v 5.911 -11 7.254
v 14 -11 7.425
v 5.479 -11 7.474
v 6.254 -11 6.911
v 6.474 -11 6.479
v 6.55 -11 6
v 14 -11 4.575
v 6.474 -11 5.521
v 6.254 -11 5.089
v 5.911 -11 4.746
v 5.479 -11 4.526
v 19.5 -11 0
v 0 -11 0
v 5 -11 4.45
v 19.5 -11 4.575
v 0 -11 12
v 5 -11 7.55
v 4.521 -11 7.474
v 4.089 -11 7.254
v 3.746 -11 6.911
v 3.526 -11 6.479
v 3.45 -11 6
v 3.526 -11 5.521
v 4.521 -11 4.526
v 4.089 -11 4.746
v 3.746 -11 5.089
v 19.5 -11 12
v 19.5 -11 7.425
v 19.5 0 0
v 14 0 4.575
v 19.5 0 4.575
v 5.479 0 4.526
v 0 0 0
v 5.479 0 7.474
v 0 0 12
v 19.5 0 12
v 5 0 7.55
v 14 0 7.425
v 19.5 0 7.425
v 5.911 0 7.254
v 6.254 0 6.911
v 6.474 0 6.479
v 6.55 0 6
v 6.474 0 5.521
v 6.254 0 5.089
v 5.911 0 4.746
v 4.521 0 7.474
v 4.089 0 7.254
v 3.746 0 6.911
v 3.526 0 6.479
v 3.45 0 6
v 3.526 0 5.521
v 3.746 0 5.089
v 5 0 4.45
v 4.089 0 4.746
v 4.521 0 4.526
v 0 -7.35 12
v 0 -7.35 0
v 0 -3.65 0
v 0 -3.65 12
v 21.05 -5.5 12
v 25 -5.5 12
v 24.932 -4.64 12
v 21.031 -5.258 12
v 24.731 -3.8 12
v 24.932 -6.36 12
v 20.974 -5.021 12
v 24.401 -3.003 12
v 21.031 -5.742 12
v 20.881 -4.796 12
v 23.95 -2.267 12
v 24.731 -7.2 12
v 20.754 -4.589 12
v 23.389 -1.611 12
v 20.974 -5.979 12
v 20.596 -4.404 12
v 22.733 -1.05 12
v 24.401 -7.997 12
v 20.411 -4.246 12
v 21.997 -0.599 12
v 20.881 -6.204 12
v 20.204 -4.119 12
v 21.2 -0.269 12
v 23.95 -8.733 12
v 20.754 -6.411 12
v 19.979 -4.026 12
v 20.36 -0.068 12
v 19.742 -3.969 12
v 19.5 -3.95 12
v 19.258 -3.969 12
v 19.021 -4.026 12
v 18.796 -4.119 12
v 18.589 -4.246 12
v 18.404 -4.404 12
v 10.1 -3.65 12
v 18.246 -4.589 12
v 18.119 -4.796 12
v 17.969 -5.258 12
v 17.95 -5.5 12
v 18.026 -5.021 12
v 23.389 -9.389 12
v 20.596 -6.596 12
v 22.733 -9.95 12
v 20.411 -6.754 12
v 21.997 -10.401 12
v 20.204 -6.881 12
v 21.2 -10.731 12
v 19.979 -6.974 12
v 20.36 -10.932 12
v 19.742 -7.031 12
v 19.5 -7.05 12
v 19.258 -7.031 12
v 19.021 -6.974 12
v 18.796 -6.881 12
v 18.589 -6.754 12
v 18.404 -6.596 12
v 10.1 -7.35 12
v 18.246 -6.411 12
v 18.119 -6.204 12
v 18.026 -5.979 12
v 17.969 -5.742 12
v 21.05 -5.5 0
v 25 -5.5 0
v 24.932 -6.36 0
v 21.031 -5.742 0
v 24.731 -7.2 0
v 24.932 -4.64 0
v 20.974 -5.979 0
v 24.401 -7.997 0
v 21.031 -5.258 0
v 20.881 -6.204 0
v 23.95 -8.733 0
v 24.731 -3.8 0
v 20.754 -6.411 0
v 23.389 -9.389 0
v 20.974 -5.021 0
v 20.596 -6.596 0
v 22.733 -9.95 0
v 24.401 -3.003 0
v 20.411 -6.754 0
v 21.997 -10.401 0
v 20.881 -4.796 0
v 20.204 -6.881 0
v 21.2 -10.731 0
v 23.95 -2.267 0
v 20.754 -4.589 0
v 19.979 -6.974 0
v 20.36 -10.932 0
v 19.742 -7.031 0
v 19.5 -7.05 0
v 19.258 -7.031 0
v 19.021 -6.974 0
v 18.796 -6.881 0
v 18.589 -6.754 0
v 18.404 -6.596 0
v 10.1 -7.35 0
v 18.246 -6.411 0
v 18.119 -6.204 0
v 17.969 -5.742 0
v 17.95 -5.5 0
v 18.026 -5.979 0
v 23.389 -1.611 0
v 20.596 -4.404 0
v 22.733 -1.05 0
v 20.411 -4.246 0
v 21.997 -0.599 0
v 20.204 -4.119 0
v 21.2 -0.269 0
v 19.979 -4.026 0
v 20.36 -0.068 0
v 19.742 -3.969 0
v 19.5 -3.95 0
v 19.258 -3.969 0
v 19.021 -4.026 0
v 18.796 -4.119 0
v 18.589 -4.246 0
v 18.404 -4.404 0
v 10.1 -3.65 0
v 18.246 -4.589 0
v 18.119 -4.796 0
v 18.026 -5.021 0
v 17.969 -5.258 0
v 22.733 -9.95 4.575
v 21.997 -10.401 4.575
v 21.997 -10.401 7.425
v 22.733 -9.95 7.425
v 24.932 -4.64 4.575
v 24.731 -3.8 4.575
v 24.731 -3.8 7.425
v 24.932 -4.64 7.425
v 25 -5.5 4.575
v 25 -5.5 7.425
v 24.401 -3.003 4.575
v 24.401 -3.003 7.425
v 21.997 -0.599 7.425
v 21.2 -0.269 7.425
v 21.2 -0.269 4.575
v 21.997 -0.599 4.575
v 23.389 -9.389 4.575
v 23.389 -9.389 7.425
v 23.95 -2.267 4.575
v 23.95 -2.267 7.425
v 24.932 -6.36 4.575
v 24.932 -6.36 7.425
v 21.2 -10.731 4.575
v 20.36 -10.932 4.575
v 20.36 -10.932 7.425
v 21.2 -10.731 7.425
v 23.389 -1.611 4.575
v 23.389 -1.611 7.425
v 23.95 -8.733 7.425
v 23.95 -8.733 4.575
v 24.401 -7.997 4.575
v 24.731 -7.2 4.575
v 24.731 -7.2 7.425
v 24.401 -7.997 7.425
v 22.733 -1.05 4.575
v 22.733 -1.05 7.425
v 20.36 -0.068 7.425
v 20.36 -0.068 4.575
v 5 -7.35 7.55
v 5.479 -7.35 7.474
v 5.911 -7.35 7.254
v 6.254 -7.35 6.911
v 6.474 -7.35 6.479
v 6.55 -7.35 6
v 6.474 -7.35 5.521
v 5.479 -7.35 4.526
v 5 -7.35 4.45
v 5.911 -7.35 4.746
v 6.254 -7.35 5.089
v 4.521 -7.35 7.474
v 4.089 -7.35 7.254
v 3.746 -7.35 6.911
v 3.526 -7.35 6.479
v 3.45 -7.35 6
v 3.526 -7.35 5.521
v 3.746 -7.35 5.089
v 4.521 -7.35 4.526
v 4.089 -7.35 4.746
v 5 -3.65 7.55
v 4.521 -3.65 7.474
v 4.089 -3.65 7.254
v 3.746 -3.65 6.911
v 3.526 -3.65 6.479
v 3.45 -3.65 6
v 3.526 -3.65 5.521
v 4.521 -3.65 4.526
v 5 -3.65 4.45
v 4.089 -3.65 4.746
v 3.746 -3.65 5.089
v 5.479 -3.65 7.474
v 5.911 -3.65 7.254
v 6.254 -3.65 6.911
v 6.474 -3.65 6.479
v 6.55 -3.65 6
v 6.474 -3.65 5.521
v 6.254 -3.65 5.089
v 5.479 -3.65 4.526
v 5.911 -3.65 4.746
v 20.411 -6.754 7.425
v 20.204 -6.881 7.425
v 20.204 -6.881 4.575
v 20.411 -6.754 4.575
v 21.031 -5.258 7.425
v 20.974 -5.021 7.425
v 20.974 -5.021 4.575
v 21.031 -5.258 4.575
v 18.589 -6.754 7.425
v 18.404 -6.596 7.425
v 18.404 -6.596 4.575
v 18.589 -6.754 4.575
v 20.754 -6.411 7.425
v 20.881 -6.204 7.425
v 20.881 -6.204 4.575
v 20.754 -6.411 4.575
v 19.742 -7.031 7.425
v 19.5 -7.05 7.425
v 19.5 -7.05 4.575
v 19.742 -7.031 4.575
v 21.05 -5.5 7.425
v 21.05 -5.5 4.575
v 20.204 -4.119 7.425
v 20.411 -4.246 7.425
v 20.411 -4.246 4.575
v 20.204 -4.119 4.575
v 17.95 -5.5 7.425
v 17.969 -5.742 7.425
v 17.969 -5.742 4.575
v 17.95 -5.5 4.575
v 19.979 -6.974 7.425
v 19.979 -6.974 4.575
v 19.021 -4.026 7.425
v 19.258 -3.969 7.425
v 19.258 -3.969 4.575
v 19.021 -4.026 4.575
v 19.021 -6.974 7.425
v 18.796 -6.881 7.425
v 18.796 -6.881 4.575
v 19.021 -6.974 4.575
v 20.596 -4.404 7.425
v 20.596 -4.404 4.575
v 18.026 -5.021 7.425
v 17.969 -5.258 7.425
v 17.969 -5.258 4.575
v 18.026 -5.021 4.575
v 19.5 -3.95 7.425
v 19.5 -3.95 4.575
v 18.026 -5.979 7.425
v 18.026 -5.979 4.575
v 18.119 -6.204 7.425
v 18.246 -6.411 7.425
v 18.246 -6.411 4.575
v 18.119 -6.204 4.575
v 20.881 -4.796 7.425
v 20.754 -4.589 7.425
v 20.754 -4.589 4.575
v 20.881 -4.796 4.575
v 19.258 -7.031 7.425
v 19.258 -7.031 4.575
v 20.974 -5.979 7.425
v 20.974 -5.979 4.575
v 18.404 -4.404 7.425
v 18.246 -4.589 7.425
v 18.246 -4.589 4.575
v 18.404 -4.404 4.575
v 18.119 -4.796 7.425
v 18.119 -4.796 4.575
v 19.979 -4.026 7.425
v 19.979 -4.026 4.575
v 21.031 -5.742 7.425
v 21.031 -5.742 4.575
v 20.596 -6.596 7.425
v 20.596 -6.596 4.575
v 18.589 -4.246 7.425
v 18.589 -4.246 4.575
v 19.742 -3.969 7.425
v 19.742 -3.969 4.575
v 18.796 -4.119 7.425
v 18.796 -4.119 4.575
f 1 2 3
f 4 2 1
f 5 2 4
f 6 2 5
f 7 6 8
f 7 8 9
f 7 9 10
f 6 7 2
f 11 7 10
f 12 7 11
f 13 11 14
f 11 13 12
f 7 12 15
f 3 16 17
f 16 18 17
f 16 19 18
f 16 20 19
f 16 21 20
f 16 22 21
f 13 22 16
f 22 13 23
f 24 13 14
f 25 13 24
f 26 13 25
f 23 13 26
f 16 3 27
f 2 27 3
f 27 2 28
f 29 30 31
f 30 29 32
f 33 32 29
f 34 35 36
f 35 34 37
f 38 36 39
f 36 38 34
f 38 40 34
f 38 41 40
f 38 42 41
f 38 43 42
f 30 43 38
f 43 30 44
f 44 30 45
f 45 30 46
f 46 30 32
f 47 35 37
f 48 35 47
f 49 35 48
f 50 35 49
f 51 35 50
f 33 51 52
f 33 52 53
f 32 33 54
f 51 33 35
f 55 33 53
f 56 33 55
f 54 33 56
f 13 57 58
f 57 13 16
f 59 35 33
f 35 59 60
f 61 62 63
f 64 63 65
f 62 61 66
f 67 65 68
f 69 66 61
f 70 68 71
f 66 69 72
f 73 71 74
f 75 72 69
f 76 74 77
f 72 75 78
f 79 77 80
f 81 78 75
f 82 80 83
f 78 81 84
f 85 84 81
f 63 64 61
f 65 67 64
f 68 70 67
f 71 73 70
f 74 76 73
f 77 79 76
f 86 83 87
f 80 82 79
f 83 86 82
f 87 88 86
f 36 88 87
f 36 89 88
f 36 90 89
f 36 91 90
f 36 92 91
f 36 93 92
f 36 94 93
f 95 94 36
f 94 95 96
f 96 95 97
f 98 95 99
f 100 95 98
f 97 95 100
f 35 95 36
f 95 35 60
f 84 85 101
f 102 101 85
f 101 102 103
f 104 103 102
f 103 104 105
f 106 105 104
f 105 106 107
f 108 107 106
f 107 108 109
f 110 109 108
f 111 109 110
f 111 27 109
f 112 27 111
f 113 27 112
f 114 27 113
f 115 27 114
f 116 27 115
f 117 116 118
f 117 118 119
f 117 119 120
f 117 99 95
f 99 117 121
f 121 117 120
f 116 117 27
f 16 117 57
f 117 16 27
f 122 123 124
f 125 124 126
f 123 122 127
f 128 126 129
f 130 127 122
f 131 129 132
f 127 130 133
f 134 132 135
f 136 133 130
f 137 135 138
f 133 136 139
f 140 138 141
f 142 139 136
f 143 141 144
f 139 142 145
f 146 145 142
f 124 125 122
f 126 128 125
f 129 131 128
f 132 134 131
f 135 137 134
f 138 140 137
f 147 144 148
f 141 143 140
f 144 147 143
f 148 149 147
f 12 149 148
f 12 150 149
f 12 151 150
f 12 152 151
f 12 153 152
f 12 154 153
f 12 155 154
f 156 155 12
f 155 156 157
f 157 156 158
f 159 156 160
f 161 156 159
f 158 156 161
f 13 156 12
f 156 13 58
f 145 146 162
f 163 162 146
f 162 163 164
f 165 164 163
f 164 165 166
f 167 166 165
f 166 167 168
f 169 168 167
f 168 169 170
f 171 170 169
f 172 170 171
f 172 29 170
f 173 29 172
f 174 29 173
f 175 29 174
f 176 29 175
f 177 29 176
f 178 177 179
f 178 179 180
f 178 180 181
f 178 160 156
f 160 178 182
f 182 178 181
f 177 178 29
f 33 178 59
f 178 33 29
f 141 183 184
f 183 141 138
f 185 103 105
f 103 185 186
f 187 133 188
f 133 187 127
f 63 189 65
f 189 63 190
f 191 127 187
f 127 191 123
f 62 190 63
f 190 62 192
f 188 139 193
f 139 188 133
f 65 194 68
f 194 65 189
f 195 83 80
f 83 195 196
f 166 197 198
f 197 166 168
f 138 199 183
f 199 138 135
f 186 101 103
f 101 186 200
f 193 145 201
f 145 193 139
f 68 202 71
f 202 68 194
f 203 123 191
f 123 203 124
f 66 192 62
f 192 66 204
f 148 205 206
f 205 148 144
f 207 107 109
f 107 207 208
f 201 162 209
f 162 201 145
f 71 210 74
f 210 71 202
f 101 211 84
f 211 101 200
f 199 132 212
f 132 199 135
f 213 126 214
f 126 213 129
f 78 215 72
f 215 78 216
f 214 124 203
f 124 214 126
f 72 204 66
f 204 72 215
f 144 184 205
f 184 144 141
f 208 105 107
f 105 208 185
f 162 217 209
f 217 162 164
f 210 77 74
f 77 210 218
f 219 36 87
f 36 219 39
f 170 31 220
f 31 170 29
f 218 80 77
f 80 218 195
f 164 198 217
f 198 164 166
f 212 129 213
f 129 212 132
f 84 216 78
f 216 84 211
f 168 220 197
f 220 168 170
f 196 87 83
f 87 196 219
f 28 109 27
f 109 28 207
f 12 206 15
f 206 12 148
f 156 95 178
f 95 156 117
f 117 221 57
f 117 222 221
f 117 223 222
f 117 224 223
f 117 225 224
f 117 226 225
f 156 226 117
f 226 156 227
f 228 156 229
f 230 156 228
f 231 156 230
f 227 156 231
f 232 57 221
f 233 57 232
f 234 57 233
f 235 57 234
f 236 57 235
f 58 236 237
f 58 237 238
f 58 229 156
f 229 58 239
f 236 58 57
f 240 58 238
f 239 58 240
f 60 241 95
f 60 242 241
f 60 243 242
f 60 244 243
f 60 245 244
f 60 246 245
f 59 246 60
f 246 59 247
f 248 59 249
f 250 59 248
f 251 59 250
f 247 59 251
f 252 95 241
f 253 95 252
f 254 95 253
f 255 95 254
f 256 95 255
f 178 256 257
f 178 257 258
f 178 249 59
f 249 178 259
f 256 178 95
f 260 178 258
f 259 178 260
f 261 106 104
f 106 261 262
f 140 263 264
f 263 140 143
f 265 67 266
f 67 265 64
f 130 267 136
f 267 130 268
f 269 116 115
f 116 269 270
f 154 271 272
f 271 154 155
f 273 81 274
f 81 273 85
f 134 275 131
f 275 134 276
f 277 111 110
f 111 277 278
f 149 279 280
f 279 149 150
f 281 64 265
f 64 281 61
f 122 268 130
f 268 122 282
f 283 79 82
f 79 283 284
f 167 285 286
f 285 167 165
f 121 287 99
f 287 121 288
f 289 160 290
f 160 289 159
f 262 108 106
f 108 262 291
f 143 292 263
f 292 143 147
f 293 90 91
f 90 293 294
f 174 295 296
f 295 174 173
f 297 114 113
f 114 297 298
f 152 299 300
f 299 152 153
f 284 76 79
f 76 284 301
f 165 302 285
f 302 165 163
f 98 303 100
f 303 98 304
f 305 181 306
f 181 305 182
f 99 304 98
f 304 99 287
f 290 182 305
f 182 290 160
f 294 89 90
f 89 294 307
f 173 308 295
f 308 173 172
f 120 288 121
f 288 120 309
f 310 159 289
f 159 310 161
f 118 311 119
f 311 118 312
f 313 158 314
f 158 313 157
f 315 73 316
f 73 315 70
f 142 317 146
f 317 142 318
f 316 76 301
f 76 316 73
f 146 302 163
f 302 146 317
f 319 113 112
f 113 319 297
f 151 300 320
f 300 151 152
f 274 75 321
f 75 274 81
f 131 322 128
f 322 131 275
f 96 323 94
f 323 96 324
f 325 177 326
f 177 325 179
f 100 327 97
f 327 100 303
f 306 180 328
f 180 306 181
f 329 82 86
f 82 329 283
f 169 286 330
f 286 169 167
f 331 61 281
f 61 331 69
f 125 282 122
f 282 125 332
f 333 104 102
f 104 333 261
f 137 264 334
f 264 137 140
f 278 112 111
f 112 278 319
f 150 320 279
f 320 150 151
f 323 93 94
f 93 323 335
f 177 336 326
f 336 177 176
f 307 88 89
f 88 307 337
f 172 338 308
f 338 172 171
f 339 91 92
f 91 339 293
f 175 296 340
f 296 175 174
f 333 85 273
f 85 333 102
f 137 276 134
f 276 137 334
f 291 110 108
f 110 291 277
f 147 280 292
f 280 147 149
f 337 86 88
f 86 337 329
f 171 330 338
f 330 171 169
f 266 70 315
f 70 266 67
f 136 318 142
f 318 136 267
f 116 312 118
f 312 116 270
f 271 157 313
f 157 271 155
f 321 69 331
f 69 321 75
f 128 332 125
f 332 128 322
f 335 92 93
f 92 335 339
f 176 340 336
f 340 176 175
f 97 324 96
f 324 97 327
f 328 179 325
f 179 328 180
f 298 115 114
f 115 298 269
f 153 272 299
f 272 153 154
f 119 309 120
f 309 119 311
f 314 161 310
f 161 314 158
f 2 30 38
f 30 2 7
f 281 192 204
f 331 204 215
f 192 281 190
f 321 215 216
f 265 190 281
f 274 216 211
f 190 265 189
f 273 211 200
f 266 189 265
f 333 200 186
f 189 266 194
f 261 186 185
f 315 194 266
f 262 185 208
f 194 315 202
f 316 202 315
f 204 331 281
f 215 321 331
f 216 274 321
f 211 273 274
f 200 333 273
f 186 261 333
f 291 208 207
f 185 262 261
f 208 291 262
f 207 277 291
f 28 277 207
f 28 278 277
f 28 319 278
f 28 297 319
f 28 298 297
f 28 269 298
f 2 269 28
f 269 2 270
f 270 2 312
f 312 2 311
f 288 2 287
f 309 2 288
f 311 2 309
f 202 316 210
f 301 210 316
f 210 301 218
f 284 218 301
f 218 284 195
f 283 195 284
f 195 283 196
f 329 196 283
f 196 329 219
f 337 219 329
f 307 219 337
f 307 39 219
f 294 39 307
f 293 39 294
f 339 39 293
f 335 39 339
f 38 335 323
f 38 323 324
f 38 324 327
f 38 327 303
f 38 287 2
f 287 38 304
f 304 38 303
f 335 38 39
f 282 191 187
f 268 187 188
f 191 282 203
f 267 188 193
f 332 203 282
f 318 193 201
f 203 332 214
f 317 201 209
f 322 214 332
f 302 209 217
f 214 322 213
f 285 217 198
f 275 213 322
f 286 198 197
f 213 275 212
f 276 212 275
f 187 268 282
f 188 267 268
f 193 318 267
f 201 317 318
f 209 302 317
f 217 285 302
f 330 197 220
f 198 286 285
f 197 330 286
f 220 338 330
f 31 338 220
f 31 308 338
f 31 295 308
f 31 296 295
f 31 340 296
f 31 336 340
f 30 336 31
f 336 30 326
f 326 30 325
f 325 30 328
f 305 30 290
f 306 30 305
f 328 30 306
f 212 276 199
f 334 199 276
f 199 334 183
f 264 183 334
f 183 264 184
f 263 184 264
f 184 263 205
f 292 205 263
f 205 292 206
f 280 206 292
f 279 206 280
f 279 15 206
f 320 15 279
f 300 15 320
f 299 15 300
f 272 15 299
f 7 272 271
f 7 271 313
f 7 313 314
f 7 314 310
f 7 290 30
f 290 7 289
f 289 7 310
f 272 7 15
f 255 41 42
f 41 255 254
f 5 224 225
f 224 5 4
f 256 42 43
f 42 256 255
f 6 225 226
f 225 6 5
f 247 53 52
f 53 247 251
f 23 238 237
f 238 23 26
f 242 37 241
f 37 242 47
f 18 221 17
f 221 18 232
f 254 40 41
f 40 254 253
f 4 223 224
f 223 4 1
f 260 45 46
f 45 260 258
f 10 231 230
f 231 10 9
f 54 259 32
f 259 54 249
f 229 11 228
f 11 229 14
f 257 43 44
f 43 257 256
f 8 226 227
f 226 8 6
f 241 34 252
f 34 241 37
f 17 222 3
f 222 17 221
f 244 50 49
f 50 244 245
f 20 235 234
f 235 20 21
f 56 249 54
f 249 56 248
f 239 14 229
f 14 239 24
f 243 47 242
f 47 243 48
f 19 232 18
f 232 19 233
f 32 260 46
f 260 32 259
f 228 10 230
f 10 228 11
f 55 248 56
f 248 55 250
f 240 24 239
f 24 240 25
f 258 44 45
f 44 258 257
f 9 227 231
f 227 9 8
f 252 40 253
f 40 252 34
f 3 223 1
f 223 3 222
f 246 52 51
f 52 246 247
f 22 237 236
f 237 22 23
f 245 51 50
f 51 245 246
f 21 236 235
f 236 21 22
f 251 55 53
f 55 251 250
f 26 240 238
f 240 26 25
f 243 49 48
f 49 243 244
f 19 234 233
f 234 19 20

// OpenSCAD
//This is a holder for a laser maker.
//It is intended to hold laser line makers on our lasercutter.


//==========Define Geometry============
fudge = 0.1;//mm
x_len= 25;//mm - Overall length
y_len= 12;//mm - Overall width
z_len= 11;//mm - Overall height
r_end= 5.5;//mm - x-end radius
pl_thk = 3.7;//mm - Plate thickness
pl_len = 10;;//mm the depth of the cut for the plate
las_thk= 2.85;//mm - the thickness of the laser holder cutaway
r_hole = 1.55;//mm - radius of bolt hole


//==========Render====================
rotate([90,0,0])
body();


//==========Modules===================
module body()
{
   
    difference() {
        outline();
        
        //subtract clearance for plate mount
        translate([-fudge,-fudge,(z_len-pl_thk)/2])
            cube([pl_len+2*fudge,y_len+2*fudge,pl_thk]);
        
        //subtract hole for lasermount
        translate([x_len-r_end,-fudge,z_len/2])
            rotate([-90,0,0])
            cylinder( h= y_len+2*fudge, r= r_hole, $fn = 40);
        
        //subtract cutaway for lasermount body
        translate([x_len-2*r_end,(y_len-las_thk)/2,-fudge])
            cube([x_len,las_thk,z_len+2*fudge]);
        
        //subtract hole for plate mount
        translate([pl_len/2,y_len/2,0])
            cylinder( h= y_len +2*fudge, r = r_hole, $fn = 20);
        
    };
        
};

module outline() {
    //Create outline of body
    union() {
        cube([x_len-r_end,y_len,z_len]);
        translate([x_len-r_end,0,r_end])
            rotate([-90,0,0])
                cylinder(h = y_len, r = r_end, $fn = 40);
        
        
    };
};
